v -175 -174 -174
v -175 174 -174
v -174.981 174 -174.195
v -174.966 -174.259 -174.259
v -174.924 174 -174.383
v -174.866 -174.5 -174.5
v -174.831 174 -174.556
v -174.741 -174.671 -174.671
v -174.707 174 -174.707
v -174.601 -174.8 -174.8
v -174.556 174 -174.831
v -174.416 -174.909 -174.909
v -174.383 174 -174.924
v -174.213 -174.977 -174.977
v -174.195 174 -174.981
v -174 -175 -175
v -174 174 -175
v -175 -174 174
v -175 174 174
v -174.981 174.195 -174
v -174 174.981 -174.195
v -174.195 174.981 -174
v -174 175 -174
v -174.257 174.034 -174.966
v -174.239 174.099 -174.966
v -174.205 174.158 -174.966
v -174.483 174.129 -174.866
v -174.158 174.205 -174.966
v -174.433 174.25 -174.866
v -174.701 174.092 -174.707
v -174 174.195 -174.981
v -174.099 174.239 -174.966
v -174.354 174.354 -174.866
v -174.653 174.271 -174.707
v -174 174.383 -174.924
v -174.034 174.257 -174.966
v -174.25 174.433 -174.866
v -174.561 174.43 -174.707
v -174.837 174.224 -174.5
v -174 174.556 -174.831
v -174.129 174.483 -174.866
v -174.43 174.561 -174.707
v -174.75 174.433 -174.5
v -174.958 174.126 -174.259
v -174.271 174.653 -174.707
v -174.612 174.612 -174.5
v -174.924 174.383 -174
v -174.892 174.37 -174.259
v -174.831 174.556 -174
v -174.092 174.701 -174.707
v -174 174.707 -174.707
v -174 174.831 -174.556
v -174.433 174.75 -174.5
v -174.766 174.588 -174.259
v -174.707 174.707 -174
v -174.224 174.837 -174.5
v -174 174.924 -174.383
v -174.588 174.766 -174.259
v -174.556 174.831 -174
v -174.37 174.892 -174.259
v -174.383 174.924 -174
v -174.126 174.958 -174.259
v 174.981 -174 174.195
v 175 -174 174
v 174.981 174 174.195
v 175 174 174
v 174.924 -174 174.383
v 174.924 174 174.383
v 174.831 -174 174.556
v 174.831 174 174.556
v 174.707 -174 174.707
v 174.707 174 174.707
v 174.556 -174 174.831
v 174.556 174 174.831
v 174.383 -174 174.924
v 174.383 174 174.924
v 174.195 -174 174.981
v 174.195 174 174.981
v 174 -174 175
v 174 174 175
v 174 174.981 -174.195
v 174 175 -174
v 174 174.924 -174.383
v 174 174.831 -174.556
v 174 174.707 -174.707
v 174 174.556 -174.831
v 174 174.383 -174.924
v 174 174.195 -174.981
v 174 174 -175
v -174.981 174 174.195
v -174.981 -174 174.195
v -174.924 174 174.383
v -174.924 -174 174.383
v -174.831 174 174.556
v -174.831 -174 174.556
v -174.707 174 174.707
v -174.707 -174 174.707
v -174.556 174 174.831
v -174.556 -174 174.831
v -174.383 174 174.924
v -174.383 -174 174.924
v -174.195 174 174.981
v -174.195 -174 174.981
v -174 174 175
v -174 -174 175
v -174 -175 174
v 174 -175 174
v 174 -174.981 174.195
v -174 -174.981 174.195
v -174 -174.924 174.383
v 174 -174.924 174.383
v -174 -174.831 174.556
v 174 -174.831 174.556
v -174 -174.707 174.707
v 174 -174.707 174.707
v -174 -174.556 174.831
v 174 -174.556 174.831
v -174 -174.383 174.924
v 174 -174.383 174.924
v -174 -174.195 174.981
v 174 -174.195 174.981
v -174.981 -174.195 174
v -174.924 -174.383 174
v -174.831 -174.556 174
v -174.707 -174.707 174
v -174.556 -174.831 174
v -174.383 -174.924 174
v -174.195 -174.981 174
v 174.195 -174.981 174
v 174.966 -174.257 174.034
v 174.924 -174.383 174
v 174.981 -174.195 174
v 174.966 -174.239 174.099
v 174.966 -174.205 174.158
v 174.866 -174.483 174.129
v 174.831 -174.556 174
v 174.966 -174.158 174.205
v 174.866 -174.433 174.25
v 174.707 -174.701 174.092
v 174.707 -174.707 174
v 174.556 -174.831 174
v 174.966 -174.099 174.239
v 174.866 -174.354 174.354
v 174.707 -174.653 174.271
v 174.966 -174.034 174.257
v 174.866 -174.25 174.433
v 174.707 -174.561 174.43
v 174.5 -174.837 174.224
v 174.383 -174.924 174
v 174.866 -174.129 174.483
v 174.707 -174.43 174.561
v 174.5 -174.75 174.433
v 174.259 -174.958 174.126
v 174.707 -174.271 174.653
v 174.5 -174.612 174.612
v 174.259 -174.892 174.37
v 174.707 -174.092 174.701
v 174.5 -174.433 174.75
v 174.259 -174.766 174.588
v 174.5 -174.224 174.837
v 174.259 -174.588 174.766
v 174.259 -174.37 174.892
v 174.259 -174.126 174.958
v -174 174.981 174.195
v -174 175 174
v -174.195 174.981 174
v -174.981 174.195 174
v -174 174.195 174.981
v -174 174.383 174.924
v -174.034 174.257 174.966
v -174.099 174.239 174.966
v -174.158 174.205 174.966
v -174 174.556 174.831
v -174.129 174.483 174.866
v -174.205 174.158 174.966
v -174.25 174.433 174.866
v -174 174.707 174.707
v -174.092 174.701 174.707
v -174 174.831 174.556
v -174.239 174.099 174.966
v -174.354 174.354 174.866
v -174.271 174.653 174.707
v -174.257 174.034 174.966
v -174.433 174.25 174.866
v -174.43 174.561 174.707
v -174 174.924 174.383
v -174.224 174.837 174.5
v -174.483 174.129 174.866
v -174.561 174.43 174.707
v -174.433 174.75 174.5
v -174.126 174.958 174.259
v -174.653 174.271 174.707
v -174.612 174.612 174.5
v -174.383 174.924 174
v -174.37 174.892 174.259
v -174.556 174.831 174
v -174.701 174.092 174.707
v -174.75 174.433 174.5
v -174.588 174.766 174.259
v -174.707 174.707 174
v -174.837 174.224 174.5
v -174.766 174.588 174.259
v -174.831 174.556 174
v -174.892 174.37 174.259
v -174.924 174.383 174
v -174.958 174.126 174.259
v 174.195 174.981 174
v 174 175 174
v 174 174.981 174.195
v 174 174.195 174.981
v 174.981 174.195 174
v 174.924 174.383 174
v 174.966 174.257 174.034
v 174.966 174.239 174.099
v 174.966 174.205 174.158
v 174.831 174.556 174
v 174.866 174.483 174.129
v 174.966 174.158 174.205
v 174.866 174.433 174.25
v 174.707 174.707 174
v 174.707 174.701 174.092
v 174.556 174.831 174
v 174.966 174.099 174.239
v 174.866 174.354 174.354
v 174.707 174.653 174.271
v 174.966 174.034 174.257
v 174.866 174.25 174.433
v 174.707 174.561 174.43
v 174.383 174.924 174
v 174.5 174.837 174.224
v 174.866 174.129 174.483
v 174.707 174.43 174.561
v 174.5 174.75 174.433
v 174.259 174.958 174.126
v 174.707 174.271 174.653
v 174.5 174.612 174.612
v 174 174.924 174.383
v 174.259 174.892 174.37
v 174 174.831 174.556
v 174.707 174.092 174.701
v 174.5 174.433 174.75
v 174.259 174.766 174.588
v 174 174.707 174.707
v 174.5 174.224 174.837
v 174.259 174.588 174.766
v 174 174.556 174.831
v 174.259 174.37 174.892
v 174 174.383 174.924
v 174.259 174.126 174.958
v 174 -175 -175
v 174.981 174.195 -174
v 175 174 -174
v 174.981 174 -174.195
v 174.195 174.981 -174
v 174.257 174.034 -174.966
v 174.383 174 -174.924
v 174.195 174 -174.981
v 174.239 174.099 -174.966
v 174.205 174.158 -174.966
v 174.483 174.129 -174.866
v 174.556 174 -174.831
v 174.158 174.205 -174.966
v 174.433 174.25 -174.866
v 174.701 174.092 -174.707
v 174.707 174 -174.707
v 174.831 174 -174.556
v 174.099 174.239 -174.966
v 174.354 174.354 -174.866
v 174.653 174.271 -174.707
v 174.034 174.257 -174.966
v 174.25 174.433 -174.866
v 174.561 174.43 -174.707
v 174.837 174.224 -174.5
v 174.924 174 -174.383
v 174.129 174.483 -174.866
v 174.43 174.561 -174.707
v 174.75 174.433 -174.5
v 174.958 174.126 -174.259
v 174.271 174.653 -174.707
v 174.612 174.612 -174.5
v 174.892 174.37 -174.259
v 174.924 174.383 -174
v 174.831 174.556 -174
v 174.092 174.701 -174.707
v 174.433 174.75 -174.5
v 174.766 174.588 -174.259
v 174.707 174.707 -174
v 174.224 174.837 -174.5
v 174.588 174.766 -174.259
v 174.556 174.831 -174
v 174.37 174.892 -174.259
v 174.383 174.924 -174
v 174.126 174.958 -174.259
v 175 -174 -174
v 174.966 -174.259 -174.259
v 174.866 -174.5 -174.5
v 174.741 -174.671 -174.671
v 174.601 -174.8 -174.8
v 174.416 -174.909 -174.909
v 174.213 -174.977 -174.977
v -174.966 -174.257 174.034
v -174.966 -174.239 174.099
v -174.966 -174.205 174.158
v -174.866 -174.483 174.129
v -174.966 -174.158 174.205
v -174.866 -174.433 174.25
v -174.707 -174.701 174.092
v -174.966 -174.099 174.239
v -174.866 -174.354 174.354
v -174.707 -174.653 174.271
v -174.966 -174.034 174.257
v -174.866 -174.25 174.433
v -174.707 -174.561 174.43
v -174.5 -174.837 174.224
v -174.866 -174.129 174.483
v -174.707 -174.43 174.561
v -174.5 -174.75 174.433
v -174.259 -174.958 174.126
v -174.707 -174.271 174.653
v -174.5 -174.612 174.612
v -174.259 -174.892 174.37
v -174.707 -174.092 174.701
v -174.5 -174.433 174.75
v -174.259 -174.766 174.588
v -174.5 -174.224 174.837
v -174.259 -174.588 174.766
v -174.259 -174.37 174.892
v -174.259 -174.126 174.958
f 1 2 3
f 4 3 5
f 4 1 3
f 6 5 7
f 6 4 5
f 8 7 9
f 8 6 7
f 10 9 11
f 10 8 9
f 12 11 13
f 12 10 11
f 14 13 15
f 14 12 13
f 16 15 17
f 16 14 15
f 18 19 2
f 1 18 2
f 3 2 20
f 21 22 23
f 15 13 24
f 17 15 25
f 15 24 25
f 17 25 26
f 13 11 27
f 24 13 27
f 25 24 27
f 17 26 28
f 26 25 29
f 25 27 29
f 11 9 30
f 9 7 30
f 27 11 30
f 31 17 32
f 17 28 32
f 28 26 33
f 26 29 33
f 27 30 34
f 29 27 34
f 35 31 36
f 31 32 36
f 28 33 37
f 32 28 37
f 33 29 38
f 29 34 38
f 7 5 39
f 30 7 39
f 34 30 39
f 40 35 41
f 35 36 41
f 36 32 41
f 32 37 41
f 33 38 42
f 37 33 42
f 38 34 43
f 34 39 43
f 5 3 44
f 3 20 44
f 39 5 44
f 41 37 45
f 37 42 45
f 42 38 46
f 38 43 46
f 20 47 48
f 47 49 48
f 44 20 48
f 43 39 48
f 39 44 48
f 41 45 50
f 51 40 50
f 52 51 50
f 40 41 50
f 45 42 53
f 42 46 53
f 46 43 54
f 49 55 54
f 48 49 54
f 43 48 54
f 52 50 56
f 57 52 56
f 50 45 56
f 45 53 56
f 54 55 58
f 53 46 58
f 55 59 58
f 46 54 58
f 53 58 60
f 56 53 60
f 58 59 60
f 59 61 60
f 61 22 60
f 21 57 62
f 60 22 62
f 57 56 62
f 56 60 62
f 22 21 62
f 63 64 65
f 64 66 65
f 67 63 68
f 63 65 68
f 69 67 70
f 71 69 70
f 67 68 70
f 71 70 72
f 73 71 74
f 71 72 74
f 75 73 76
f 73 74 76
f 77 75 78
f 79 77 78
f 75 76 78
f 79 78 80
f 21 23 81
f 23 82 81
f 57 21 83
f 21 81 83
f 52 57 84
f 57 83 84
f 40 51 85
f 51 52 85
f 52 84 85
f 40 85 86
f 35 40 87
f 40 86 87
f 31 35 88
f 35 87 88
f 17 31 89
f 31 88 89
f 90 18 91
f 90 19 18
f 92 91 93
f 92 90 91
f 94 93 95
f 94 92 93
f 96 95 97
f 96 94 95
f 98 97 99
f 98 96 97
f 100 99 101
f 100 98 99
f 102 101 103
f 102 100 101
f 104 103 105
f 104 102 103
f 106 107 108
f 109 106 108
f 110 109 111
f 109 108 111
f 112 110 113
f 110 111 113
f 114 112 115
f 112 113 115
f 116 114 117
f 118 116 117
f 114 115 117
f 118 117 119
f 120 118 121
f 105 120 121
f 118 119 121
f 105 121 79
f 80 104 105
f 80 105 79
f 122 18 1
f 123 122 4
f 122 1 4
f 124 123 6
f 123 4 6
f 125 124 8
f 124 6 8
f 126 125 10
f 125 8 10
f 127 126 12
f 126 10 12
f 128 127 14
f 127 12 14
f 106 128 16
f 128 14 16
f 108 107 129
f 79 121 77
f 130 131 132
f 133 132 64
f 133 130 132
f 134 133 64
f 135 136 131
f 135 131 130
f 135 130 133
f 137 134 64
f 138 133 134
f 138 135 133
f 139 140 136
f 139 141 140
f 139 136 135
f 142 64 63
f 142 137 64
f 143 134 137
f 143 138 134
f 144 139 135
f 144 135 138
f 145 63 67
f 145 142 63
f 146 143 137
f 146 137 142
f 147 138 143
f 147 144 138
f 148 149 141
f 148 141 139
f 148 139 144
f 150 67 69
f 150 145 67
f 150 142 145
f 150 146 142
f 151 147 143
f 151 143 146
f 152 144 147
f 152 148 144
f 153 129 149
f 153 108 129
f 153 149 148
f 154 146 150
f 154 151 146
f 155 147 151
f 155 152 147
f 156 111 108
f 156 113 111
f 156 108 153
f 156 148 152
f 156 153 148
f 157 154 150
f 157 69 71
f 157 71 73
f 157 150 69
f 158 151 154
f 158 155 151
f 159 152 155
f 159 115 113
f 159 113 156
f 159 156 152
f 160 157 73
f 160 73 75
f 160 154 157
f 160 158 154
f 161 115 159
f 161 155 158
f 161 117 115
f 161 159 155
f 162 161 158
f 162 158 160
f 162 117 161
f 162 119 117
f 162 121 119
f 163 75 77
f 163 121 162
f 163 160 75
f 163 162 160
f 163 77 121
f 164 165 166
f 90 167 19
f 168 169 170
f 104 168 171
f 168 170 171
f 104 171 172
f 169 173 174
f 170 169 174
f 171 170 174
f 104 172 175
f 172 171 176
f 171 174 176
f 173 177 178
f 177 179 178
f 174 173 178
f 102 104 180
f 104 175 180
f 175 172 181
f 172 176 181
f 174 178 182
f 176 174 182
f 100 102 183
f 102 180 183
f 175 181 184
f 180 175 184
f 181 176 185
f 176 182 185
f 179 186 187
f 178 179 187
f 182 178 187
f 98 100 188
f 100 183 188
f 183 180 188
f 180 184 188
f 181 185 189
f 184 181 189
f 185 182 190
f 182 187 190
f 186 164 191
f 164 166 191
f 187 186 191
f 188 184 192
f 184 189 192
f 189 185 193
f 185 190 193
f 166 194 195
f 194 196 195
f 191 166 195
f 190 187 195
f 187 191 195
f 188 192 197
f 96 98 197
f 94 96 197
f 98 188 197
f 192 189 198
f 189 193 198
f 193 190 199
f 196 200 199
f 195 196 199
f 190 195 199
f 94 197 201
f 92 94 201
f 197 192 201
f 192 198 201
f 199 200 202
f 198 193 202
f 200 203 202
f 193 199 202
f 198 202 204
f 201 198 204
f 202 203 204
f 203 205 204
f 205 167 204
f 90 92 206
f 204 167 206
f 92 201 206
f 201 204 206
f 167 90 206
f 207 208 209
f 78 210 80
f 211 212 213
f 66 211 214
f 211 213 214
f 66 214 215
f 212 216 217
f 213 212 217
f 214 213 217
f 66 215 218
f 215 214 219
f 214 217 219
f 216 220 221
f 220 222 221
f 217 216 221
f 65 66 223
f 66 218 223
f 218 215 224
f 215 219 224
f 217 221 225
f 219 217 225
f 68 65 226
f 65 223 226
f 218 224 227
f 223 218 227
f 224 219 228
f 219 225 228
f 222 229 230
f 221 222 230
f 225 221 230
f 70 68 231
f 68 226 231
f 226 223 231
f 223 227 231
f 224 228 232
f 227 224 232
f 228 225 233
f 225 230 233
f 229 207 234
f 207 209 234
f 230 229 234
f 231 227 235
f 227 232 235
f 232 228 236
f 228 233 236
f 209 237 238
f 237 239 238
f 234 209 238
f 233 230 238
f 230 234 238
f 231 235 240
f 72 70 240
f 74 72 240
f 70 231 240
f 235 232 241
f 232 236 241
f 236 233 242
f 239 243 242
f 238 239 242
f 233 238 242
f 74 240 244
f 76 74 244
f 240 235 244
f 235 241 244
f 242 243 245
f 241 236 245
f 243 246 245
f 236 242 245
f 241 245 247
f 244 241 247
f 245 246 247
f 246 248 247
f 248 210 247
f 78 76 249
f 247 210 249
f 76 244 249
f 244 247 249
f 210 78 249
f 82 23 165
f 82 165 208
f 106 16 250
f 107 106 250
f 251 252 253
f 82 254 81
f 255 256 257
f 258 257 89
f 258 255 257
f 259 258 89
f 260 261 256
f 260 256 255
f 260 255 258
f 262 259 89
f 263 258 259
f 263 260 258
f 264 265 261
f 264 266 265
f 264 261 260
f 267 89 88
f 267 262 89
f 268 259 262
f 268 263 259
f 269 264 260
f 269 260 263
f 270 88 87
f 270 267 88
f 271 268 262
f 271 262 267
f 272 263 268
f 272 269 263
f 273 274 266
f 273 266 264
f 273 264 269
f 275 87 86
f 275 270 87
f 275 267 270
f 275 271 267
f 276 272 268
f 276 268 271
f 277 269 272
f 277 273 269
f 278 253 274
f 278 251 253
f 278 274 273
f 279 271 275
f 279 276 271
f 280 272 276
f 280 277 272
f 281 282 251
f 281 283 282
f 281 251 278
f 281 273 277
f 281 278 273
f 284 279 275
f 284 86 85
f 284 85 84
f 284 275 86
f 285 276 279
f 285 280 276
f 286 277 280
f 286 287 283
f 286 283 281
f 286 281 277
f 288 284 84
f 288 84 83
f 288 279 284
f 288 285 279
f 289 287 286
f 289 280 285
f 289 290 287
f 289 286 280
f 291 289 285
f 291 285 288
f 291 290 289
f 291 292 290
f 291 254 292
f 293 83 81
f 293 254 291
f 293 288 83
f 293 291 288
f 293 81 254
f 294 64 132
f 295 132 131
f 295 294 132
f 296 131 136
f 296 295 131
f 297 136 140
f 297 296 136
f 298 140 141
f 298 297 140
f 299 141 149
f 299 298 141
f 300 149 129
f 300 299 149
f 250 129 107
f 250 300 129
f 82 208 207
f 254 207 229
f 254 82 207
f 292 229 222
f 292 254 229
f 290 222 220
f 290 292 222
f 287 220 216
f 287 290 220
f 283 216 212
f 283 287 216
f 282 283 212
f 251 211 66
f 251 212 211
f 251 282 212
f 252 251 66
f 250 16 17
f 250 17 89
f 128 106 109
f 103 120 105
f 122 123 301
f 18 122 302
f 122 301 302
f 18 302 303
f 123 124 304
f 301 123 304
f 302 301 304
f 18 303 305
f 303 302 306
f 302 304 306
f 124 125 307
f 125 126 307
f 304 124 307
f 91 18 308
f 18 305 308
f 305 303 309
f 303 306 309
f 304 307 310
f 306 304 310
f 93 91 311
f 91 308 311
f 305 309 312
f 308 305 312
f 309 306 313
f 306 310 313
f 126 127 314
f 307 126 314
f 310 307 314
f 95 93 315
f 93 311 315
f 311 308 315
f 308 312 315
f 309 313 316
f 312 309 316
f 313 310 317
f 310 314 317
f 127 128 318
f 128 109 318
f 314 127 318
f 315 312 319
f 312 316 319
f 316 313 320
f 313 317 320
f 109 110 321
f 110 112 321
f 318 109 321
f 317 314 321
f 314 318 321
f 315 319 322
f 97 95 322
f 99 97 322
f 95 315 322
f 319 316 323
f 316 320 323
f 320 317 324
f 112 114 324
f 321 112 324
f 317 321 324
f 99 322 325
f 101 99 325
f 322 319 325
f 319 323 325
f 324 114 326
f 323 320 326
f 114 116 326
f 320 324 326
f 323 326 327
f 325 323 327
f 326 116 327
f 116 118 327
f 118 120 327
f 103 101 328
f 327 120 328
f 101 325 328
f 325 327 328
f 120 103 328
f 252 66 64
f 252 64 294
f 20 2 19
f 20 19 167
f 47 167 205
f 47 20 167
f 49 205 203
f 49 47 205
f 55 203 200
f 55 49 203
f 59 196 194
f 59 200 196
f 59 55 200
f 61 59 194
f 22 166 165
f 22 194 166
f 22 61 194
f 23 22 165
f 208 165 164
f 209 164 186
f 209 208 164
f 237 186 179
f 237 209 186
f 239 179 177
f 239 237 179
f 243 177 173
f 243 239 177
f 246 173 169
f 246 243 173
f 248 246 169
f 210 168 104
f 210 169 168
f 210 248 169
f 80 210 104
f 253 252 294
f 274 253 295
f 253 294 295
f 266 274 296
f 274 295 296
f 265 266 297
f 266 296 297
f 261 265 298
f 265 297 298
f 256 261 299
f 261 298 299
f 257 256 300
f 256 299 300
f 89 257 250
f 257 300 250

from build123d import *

# Parameters (mm, degrees)
SKETCH1_W           = 350
SKETCH1_H           = 350
BOSS_EXTRUDE1_DEPTH = 175
FILLET1_R           = 1


with BuildPart() as part:
    # Sketch1 → Boss-Extrude1 (new, symmetric)
    with BuildSketch(Plane(origin=(0, 0, 0), x_dir=(1, 0, 0), z_dir=(0, 1, 0))):
        Rectangle(SKETCH1_W, SKETCH1_H)
    extrude(amount=BOSS_EXTRUDE1_DEPTH, both=True)

    # Fillet1
    fillet1_edges = [part.edges().sort_by_distance(p)[0] for p in [
        (-175, 175, 0),
        (0, 175, 175),
        (175, 175, 0),
        (0, -175, 175),
        (-175, -175, 0),
        (175, -175, 0),
        (175, 0, 175),
        (-175, 0, 175),
        (-175, 0, -175),
        (175, 0, -175),
        (0, 175, -175),
    ]]
    fillet(fillet1_edges, radius=FILLET1_R)


solid = part.part
